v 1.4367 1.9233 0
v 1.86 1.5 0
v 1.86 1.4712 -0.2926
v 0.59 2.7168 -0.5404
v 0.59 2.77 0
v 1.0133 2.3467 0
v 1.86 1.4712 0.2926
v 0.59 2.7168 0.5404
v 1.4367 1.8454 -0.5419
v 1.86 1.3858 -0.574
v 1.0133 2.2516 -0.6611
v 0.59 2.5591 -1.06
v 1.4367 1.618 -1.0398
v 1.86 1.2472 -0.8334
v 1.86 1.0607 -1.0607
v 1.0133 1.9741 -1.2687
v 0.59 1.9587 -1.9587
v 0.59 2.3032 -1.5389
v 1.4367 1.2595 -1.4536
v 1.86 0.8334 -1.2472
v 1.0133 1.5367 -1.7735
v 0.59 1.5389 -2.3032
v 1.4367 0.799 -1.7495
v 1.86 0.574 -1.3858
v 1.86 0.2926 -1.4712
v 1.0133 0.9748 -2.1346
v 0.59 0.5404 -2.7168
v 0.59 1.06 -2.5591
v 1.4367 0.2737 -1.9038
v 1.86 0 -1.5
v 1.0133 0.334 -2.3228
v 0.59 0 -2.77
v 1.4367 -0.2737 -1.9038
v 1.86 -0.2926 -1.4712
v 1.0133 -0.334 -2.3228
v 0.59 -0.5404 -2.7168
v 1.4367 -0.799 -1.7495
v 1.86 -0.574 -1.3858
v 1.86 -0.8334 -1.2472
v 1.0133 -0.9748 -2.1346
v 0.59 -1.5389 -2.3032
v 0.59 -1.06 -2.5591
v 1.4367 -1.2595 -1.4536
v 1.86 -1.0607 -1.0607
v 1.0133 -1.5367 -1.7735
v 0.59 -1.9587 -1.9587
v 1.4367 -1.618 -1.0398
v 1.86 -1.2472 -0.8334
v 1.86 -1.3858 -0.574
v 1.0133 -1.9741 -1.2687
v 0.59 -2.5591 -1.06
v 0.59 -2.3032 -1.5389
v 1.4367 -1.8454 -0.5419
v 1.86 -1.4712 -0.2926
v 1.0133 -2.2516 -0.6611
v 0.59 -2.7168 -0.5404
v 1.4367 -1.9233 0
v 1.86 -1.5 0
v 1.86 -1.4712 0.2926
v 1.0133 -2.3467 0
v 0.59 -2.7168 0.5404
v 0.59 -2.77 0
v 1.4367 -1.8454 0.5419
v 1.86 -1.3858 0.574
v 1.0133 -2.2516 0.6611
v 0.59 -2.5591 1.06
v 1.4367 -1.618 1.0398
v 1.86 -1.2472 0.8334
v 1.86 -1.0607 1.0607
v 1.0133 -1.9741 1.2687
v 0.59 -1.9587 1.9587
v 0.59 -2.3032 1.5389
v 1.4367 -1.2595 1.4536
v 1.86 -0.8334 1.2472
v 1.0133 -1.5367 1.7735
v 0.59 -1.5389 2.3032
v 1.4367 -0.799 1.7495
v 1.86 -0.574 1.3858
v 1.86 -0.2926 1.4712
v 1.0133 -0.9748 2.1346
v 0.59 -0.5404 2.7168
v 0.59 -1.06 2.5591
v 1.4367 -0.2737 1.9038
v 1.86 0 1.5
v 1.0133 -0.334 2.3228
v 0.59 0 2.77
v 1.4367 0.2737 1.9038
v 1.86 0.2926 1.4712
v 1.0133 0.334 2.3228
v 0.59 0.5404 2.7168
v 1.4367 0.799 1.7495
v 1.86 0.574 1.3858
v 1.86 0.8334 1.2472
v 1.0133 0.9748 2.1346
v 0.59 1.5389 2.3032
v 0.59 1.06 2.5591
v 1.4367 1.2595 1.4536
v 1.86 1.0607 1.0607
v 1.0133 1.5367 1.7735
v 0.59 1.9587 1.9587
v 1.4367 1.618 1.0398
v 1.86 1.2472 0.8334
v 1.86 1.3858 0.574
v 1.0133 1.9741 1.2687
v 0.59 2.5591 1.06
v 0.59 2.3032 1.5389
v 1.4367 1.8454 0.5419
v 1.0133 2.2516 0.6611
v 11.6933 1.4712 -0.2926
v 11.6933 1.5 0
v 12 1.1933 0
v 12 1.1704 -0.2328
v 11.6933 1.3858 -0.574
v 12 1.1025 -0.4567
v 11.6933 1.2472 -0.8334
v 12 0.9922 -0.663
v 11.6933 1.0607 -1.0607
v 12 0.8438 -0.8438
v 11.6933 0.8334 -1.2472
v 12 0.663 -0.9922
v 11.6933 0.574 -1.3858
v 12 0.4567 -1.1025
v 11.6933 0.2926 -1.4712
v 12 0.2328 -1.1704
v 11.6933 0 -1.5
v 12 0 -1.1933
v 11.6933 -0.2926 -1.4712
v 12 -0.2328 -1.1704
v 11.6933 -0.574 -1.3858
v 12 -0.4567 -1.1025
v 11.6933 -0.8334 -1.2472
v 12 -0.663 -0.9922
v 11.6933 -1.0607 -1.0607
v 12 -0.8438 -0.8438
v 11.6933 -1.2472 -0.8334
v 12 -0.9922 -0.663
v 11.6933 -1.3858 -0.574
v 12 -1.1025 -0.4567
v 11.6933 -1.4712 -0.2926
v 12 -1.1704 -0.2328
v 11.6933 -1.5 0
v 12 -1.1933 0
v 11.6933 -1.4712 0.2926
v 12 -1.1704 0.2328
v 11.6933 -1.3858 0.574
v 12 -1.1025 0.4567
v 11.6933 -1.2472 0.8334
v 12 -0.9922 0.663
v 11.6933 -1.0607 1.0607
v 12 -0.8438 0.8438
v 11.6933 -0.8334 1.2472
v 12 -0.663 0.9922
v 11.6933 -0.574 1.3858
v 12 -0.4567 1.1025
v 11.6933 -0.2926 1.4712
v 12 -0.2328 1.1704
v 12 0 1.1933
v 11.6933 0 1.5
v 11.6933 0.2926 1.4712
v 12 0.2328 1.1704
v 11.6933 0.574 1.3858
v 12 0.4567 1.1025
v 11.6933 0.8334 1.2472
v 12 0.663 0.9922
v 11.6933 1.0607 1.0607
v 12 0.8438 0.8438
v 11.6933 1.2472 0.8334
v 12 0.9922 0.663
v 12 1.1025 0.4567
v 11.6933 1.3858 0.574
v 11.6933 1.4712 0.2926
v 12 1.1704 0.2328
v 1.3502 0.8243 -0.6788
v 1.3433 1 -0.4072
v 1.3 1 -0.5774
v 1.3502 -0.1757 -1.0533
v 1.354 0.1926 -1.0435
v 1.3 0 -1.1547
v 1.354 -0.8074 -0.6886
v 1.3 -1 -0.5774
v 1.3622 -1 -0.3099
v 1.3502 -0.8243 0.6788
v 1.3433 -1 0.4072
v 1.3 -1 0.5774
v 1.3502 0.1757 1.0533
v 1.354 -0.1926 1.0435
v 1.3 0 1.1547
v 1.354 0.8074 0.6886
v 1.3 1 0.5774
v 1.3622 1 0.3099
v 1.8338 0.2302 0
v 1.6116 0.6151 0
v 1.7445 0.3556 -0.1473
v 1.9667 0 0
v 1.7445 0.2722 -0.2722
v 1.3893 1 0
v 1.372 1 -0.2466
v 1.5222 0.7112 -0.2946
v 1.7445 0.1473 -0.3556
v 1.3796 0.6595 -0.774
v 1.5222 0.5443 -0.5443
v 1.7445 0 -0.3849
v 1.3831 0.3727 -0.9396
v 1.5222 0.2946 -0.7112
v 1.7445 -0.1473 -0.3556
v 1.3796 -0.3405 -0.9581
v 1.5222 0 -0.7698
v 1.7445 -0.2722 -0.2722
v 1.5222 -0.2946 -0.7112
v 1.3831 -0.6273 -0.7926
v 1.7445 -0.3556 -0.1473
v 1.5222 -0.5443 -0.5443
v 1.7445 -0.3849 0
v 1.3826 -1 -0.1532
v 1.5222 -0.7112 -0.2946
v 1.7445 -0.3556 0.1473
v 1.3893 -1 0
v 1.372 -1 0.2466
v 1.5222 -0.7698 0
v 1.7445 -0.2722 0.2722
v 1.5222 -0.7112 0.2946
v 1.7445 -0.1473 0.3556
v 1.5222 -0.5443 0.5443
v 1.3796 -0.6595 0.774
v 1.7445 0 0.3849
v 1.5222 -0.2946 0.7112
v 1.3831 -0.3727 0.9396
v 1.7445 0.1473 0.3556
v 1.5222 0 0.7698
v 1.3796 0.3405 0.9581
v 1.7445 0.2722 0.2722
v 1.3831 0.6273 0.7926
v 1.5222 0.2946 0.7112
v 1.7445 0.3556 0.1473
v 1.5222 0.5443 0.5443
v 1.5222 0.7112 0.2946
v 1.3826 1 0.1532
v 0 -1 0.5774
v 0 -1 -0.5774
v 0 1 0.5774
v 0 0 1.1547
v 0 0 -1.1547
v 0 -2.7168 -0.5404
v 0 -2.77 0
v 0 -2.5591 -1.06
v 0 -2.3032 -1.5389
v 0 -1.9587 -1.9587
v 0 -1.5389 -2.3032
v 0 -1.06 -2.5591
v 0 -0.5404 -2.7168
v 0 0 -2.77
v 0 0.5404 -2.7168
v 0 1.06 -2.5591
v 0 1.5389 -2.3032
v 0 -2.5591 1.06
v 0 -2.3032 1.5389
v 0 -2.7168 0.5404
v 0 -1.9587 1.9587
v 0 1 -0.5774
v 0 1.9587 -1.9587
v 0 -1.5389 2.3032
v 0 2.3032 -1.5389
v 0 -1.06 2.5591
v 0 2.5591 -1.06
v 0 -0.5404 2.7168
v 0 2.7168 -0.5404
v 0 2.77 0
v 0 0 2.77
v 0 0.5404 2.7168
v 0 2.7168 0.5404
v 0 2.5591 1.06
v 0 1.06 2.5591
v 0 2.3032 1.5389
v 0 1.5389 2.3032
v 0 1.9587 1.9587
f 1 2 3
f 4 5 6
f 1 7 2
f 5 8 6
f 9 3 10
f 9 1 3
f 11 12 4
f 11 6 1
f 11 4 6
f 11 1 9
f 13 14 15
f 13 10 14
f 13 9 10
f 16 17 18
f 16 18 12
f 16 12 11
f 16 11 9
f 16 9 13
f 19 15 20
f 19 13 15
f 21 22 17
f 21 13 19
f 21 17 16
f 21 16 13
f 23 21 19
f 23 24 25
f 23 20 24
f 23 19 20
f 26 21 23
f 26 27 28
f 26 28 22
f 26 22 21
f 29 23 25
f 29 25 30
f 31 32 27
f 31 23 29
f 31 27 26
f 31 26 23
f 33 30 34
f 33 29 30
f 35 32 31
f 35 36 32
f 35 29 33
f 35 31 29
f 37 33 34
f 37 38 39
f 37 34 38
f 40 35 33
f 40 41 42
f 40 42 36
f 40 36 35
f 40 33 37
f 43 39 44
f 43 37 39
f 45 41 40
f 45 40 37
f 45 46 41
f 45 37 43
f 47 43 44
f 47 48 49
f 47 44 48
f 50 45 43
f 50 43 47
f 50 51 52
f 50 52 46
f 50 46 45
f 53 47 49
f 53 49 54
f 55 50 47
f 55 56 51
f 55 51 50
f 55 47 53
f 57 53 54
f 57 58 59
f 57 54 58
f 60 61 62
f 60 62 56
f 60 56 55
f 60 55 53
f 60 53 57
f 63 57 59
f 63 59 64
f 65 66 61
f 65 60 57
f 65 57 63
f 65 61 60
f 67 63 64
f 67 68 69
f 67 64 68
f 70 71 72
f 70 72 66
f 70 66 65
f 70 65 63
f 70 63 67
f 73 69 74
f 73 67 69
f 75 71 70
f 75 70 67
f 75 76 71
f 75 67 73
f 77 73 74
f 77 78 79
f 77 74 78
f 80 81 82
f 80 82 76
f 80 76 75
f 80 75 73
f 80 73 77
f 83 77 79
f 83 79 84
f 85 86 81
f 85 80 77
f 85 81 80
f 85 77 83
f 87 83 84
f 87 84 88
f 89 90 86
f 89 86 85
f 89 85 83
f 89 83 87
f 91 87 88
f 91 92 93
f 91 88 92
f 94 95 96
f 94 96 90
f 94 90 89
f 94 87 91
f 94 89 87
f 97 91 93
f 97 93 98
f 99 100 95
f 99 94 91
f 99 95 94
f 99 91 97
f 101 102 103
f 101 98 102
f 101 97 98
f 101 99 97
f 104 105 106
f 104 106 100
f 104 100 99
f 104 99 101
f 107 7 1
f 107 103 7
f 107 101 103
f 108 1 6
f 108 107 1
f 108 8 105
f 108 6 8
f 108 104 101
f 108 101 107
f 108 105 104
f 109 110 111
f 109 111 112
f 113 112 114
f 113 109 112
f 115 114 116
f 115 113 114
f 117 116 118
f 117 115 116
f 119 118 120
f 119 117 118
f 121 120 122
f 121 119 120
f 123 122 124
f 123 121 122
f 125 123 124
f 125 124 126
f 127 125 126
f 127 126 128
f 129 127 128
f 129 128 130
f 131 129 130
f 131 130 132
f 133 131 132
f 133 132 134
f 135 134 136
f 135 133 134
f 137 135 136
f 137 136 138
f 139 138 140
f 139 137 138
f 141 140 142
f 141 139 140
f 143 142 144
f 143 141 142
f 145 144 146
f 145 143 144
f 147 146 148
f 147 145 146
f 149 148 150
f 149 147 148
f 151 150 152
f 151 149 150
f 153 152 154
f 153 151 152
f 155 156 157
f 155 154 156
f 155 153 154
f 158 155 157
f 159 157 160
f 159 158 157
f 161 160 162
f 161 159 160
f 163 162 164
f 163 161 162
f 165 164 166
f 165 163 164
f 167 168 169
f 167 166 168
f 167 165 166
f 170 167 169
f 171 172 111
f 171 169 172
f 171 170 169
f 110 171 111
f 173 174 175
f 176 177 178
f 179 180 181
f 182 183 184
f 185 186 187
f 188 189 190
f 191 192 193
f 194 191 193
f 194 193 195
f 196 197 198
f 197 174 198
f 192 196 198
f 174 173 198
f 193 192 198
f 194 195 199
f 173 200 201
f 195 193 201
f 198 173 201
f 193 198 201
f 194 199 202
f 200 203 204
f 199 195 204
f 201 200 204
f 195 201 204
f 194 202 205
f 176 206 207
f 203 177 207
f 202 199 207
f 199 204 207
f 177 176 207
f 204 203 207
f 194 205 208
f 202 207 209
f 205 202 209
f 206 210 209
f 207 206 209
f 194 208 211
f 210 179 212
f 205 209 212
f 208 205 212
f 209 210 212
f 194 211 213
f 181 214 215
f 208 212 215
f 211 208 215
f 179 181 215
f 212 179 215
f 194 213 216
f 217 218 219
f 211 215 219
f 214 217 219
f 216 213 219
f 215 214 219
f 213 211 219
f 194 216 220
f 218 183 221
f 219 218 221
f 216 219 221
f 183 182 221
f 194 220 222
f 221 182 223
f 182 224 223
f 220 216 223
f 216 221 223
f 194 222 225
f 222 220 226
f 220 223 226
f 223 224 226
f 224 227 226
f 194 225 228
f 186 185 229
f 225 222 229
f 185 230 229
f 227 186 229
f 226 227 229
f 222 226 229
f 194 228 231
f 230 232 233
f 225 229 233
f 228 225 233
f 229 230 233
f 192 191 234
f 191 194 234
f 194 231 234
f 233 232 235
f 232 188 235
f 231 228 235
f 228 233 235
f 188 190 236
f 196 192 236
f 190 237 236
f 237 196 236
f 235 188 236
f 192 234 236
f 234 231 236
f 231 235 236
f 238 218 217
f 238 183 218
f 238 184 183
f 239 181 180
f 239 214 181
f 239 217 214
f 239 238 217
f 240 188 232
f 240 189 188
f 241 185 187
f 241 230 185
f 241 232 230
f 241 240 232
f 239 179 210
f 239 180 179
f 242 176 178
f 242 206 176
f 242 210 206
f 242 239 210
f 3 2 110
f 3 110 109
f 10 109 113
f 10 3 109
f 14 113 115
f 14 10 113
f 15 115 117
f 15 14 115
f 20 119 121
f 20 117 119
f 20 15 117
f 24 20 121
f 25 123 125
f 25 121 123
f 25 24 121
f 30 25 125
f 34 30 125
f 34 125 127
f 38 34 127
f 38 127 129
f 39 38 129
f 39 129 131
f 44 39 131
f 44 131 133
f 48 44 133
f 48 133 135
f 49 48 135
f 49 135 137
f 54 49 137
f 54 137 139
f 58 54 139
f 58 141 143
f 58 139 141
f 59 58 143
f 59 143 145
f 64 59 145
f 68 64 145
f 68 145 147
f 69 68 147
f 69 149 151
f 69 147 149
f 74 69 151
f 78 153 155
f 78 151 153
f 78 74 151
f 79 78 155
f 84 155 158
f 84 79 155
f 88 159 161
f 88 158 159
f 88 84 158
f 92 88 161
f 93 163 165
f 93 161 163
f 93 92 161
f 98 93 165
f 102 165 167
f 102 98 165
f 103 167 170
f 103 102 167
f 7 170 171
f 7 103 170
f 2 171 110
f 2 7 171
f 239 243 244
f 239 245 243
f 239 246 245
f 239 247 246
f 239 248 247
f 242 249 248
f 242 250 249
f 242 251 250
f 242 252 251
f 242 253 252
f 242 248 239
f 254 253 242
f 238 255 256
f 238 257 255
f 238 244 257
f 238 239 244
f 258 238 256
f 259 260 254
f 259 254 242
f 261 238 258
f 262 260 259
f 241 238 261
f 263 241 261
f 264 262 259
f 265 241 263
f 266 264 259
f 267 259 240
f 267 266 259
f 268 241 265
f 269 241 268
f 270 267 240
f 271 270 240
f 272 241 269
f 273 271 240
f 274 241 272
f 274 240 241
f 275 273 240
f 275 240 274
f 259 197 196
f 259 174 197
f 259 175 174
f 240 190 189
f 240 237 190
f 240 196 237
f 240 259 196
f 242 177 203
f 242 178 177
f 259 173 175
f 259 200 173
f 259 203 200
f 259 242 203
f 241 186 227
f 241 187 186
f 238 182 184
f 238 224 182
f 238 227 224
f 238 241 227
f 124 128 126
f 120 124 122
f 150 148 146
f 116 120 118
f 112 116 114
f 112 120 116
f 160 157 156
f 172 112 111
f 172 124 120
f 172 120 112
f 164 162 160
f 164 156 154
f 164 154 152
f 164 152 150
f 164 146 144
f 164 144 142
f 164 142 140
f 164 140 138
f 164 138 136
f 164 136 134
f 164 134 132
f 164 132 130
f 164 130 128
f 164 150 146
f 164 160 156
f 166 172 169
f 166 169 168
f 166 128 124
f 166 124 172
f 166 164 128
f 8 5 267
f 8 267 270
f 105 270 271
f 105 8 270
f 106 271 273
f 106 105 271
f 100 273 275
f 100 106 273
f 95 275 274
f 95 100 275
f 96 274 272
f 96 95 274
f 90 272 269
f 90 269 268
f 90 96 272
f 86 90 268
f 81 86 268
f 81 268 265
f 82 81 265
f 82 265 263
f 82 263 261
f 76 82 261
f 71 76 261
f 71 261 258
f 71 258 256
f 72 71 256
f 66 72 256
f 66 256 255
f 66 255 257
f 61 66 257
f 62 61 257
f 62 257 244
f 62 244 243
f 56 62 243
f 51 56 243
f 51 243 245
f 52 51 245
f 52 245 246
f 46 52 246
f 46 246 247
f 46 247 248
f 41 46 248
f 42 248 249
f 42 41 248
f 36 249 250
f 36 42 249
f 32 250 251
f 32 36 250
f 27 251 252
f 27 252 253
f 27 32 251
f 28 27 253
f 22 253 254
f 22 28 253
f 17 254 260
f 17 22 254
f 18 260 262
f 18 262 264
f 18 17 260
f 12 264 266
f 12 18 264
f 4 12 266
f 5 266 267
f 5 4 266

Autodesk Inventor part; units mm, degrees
ref_plane "YZ Plane" through (0, 0, 0) normal (1, 0, 0) x (0, 1, 0)
ref_plane "XZ Plane" through (0, 0, 0) normal (0, 1, 0) x (-1, 0, 0)
sketch "Sketch1" plane through (0, 0, 0) normal (0, 0, 1) x (1, 0, 0)
  line L0 (12, 0) -> (12, 1.5)
  line L1 (12, 1.5) -> (4, 1.5)
  line L2 (4, 1.5) -> (3.6933, 1.5)
  line L3 (0, 2.77) -> (0, 1.1547)
  line L4 (0, 1.1547) -> (1.3, 1.1547)
  line L5 (1.3, 1.1547) -> (1.9667, 0)
  line L6 (1.9667, 0) -> (12, 0)
  line L7 (0, 2.77) -> (0.59, 2.77)
  line L8 (0.59, 2.77) -> (1.86, 1.5)
  line L9 (3.6933, 1.5) -> (1.86, 1.5)
  line L10 (4, 1.5) -> (1.86, 1.5) construction
  line L11 (1.86, 1.5) -> (1.86, 1.5)
  line L12 (-2.4, 0) -> (14.4, 0) projected
  line L13 (0, -0.554) -> (0, 3.324) projected
  dimension "d0" = 12
  dimension "d1" = 8
  dimension "d2" = 1.3
  dimension "d3" = 3
  dimension "d6" = 1.86
  dimension "d7" = 45
  dimension "d8" = 2.3094
  dimension "d9" = 60
  dimension "d10" = 5.54
  dimension "d11" = 3
  dimension "d12" = 0.3067
revolve "Body" add sketch "Sketch1" angle 360 about axis through (1.9667, 0, 0) along (1, 0, 0) contours L6 L5 L4 L3 L7 L8 L9 L2 L1 L0
sketch "Sketch2" plane through (0, 0, 0) normal (-1, 0, 0) x (0, 0, 1)
  circle A0 centre (0, 0) radius 1.1547 projected
  line L0 (0, -3.878) -> (0, 3.878) projected
  line L1 (-3.878, 0) -> (3.878, 0) projected
  line L2 (1.1547, 0) -> (0.5774, -1)
  line L3 (0.5774, -1) -> (-0.5774, -1)
  line L4 (-0.5774, -1) -> (-1.1547, 0)
  line L5 (-1.1547, 0) -> (-0.5774, 1)
  line L6 (-0.5774, 1) -> (0.5774, 1)
  line L7 (0.5774, 1) -> (1.1547, 0)
  point P0 (0, 1.1547)
extrude "Slot" add sketch "Sketch2" against normal up to next contours L7 A0 | A0 L2 | L6 L0 A0 | A0 L0 L3 | L0 L6 A0 | A0 L3 L0 | L4 A0 | A0 L5
thread "Thread" size "M3x0.5" class "6g" standard "ISO Metric profile" length 8
chamfer "Chamfer1" distance 0.3067 distance2 0.3067 1 edges at (12, -1.5, 0) measured on face at (12, -0.3743, -0.3316)
ref_plane "Work Plane1" through (104.775, 0, 0) normal (0, 0, -1) x (1, 0, 0)
equation "\"d0\" = NLG"
equation "\"d1\" = GEL"
equation "\"d2\" = INTI"
equation "\"d3\" = GD"
equation "\"d6\" = KOH"
equation "\"d7\" = 0.5 * SEWI"
equation "\"d8\" = 1.1547 * SW"
equation "\"d10\" = KOD"
equation "\"d11\" = BDM"
equation "\"d12\" = GAL"
equation "\"d15\" = GEL"
equation "\"d17\" = -0.5 * SPD + 0.5 * GD"
equation "\"d18\" = GUL"
equation "\"NLG\" = 12"
equation "\"INTI\" = 1.3"
equation "\"GEL\" = 8"
equation "\"GAL\" = 0.61345 * PTC"
equation "\"KOH\" = 1.86"
equation "\"KOD\" = 5.54"
equation "\"GUL\" = 0.61345 * PTC"
equation "\"SPD\" = NND - 1.2269 * PTC"
equation "\"BDM\" = NND"
equation "\"GD\" = NND"
equation "\"SEWI\" = 90deg"
equation "\"SW\" = 2"
equation "\"TOA\" = 30deg"
equation "\"GD1\" = THREADDIA - 1.2269 * PTC"
equation "\"EPV\" = 3.36"
equation "\"THREADDIA\" = 3"
equation "\"PTC\" = 0.5"
equation "\"NND\" = 3"
equation "\"E0\" = 2.31"
equation "\"THREADDESC\" = 1.2345"
properties part number "M3 x  12 - Socket Csk Screw (A2)" material "Stainless Steel"
